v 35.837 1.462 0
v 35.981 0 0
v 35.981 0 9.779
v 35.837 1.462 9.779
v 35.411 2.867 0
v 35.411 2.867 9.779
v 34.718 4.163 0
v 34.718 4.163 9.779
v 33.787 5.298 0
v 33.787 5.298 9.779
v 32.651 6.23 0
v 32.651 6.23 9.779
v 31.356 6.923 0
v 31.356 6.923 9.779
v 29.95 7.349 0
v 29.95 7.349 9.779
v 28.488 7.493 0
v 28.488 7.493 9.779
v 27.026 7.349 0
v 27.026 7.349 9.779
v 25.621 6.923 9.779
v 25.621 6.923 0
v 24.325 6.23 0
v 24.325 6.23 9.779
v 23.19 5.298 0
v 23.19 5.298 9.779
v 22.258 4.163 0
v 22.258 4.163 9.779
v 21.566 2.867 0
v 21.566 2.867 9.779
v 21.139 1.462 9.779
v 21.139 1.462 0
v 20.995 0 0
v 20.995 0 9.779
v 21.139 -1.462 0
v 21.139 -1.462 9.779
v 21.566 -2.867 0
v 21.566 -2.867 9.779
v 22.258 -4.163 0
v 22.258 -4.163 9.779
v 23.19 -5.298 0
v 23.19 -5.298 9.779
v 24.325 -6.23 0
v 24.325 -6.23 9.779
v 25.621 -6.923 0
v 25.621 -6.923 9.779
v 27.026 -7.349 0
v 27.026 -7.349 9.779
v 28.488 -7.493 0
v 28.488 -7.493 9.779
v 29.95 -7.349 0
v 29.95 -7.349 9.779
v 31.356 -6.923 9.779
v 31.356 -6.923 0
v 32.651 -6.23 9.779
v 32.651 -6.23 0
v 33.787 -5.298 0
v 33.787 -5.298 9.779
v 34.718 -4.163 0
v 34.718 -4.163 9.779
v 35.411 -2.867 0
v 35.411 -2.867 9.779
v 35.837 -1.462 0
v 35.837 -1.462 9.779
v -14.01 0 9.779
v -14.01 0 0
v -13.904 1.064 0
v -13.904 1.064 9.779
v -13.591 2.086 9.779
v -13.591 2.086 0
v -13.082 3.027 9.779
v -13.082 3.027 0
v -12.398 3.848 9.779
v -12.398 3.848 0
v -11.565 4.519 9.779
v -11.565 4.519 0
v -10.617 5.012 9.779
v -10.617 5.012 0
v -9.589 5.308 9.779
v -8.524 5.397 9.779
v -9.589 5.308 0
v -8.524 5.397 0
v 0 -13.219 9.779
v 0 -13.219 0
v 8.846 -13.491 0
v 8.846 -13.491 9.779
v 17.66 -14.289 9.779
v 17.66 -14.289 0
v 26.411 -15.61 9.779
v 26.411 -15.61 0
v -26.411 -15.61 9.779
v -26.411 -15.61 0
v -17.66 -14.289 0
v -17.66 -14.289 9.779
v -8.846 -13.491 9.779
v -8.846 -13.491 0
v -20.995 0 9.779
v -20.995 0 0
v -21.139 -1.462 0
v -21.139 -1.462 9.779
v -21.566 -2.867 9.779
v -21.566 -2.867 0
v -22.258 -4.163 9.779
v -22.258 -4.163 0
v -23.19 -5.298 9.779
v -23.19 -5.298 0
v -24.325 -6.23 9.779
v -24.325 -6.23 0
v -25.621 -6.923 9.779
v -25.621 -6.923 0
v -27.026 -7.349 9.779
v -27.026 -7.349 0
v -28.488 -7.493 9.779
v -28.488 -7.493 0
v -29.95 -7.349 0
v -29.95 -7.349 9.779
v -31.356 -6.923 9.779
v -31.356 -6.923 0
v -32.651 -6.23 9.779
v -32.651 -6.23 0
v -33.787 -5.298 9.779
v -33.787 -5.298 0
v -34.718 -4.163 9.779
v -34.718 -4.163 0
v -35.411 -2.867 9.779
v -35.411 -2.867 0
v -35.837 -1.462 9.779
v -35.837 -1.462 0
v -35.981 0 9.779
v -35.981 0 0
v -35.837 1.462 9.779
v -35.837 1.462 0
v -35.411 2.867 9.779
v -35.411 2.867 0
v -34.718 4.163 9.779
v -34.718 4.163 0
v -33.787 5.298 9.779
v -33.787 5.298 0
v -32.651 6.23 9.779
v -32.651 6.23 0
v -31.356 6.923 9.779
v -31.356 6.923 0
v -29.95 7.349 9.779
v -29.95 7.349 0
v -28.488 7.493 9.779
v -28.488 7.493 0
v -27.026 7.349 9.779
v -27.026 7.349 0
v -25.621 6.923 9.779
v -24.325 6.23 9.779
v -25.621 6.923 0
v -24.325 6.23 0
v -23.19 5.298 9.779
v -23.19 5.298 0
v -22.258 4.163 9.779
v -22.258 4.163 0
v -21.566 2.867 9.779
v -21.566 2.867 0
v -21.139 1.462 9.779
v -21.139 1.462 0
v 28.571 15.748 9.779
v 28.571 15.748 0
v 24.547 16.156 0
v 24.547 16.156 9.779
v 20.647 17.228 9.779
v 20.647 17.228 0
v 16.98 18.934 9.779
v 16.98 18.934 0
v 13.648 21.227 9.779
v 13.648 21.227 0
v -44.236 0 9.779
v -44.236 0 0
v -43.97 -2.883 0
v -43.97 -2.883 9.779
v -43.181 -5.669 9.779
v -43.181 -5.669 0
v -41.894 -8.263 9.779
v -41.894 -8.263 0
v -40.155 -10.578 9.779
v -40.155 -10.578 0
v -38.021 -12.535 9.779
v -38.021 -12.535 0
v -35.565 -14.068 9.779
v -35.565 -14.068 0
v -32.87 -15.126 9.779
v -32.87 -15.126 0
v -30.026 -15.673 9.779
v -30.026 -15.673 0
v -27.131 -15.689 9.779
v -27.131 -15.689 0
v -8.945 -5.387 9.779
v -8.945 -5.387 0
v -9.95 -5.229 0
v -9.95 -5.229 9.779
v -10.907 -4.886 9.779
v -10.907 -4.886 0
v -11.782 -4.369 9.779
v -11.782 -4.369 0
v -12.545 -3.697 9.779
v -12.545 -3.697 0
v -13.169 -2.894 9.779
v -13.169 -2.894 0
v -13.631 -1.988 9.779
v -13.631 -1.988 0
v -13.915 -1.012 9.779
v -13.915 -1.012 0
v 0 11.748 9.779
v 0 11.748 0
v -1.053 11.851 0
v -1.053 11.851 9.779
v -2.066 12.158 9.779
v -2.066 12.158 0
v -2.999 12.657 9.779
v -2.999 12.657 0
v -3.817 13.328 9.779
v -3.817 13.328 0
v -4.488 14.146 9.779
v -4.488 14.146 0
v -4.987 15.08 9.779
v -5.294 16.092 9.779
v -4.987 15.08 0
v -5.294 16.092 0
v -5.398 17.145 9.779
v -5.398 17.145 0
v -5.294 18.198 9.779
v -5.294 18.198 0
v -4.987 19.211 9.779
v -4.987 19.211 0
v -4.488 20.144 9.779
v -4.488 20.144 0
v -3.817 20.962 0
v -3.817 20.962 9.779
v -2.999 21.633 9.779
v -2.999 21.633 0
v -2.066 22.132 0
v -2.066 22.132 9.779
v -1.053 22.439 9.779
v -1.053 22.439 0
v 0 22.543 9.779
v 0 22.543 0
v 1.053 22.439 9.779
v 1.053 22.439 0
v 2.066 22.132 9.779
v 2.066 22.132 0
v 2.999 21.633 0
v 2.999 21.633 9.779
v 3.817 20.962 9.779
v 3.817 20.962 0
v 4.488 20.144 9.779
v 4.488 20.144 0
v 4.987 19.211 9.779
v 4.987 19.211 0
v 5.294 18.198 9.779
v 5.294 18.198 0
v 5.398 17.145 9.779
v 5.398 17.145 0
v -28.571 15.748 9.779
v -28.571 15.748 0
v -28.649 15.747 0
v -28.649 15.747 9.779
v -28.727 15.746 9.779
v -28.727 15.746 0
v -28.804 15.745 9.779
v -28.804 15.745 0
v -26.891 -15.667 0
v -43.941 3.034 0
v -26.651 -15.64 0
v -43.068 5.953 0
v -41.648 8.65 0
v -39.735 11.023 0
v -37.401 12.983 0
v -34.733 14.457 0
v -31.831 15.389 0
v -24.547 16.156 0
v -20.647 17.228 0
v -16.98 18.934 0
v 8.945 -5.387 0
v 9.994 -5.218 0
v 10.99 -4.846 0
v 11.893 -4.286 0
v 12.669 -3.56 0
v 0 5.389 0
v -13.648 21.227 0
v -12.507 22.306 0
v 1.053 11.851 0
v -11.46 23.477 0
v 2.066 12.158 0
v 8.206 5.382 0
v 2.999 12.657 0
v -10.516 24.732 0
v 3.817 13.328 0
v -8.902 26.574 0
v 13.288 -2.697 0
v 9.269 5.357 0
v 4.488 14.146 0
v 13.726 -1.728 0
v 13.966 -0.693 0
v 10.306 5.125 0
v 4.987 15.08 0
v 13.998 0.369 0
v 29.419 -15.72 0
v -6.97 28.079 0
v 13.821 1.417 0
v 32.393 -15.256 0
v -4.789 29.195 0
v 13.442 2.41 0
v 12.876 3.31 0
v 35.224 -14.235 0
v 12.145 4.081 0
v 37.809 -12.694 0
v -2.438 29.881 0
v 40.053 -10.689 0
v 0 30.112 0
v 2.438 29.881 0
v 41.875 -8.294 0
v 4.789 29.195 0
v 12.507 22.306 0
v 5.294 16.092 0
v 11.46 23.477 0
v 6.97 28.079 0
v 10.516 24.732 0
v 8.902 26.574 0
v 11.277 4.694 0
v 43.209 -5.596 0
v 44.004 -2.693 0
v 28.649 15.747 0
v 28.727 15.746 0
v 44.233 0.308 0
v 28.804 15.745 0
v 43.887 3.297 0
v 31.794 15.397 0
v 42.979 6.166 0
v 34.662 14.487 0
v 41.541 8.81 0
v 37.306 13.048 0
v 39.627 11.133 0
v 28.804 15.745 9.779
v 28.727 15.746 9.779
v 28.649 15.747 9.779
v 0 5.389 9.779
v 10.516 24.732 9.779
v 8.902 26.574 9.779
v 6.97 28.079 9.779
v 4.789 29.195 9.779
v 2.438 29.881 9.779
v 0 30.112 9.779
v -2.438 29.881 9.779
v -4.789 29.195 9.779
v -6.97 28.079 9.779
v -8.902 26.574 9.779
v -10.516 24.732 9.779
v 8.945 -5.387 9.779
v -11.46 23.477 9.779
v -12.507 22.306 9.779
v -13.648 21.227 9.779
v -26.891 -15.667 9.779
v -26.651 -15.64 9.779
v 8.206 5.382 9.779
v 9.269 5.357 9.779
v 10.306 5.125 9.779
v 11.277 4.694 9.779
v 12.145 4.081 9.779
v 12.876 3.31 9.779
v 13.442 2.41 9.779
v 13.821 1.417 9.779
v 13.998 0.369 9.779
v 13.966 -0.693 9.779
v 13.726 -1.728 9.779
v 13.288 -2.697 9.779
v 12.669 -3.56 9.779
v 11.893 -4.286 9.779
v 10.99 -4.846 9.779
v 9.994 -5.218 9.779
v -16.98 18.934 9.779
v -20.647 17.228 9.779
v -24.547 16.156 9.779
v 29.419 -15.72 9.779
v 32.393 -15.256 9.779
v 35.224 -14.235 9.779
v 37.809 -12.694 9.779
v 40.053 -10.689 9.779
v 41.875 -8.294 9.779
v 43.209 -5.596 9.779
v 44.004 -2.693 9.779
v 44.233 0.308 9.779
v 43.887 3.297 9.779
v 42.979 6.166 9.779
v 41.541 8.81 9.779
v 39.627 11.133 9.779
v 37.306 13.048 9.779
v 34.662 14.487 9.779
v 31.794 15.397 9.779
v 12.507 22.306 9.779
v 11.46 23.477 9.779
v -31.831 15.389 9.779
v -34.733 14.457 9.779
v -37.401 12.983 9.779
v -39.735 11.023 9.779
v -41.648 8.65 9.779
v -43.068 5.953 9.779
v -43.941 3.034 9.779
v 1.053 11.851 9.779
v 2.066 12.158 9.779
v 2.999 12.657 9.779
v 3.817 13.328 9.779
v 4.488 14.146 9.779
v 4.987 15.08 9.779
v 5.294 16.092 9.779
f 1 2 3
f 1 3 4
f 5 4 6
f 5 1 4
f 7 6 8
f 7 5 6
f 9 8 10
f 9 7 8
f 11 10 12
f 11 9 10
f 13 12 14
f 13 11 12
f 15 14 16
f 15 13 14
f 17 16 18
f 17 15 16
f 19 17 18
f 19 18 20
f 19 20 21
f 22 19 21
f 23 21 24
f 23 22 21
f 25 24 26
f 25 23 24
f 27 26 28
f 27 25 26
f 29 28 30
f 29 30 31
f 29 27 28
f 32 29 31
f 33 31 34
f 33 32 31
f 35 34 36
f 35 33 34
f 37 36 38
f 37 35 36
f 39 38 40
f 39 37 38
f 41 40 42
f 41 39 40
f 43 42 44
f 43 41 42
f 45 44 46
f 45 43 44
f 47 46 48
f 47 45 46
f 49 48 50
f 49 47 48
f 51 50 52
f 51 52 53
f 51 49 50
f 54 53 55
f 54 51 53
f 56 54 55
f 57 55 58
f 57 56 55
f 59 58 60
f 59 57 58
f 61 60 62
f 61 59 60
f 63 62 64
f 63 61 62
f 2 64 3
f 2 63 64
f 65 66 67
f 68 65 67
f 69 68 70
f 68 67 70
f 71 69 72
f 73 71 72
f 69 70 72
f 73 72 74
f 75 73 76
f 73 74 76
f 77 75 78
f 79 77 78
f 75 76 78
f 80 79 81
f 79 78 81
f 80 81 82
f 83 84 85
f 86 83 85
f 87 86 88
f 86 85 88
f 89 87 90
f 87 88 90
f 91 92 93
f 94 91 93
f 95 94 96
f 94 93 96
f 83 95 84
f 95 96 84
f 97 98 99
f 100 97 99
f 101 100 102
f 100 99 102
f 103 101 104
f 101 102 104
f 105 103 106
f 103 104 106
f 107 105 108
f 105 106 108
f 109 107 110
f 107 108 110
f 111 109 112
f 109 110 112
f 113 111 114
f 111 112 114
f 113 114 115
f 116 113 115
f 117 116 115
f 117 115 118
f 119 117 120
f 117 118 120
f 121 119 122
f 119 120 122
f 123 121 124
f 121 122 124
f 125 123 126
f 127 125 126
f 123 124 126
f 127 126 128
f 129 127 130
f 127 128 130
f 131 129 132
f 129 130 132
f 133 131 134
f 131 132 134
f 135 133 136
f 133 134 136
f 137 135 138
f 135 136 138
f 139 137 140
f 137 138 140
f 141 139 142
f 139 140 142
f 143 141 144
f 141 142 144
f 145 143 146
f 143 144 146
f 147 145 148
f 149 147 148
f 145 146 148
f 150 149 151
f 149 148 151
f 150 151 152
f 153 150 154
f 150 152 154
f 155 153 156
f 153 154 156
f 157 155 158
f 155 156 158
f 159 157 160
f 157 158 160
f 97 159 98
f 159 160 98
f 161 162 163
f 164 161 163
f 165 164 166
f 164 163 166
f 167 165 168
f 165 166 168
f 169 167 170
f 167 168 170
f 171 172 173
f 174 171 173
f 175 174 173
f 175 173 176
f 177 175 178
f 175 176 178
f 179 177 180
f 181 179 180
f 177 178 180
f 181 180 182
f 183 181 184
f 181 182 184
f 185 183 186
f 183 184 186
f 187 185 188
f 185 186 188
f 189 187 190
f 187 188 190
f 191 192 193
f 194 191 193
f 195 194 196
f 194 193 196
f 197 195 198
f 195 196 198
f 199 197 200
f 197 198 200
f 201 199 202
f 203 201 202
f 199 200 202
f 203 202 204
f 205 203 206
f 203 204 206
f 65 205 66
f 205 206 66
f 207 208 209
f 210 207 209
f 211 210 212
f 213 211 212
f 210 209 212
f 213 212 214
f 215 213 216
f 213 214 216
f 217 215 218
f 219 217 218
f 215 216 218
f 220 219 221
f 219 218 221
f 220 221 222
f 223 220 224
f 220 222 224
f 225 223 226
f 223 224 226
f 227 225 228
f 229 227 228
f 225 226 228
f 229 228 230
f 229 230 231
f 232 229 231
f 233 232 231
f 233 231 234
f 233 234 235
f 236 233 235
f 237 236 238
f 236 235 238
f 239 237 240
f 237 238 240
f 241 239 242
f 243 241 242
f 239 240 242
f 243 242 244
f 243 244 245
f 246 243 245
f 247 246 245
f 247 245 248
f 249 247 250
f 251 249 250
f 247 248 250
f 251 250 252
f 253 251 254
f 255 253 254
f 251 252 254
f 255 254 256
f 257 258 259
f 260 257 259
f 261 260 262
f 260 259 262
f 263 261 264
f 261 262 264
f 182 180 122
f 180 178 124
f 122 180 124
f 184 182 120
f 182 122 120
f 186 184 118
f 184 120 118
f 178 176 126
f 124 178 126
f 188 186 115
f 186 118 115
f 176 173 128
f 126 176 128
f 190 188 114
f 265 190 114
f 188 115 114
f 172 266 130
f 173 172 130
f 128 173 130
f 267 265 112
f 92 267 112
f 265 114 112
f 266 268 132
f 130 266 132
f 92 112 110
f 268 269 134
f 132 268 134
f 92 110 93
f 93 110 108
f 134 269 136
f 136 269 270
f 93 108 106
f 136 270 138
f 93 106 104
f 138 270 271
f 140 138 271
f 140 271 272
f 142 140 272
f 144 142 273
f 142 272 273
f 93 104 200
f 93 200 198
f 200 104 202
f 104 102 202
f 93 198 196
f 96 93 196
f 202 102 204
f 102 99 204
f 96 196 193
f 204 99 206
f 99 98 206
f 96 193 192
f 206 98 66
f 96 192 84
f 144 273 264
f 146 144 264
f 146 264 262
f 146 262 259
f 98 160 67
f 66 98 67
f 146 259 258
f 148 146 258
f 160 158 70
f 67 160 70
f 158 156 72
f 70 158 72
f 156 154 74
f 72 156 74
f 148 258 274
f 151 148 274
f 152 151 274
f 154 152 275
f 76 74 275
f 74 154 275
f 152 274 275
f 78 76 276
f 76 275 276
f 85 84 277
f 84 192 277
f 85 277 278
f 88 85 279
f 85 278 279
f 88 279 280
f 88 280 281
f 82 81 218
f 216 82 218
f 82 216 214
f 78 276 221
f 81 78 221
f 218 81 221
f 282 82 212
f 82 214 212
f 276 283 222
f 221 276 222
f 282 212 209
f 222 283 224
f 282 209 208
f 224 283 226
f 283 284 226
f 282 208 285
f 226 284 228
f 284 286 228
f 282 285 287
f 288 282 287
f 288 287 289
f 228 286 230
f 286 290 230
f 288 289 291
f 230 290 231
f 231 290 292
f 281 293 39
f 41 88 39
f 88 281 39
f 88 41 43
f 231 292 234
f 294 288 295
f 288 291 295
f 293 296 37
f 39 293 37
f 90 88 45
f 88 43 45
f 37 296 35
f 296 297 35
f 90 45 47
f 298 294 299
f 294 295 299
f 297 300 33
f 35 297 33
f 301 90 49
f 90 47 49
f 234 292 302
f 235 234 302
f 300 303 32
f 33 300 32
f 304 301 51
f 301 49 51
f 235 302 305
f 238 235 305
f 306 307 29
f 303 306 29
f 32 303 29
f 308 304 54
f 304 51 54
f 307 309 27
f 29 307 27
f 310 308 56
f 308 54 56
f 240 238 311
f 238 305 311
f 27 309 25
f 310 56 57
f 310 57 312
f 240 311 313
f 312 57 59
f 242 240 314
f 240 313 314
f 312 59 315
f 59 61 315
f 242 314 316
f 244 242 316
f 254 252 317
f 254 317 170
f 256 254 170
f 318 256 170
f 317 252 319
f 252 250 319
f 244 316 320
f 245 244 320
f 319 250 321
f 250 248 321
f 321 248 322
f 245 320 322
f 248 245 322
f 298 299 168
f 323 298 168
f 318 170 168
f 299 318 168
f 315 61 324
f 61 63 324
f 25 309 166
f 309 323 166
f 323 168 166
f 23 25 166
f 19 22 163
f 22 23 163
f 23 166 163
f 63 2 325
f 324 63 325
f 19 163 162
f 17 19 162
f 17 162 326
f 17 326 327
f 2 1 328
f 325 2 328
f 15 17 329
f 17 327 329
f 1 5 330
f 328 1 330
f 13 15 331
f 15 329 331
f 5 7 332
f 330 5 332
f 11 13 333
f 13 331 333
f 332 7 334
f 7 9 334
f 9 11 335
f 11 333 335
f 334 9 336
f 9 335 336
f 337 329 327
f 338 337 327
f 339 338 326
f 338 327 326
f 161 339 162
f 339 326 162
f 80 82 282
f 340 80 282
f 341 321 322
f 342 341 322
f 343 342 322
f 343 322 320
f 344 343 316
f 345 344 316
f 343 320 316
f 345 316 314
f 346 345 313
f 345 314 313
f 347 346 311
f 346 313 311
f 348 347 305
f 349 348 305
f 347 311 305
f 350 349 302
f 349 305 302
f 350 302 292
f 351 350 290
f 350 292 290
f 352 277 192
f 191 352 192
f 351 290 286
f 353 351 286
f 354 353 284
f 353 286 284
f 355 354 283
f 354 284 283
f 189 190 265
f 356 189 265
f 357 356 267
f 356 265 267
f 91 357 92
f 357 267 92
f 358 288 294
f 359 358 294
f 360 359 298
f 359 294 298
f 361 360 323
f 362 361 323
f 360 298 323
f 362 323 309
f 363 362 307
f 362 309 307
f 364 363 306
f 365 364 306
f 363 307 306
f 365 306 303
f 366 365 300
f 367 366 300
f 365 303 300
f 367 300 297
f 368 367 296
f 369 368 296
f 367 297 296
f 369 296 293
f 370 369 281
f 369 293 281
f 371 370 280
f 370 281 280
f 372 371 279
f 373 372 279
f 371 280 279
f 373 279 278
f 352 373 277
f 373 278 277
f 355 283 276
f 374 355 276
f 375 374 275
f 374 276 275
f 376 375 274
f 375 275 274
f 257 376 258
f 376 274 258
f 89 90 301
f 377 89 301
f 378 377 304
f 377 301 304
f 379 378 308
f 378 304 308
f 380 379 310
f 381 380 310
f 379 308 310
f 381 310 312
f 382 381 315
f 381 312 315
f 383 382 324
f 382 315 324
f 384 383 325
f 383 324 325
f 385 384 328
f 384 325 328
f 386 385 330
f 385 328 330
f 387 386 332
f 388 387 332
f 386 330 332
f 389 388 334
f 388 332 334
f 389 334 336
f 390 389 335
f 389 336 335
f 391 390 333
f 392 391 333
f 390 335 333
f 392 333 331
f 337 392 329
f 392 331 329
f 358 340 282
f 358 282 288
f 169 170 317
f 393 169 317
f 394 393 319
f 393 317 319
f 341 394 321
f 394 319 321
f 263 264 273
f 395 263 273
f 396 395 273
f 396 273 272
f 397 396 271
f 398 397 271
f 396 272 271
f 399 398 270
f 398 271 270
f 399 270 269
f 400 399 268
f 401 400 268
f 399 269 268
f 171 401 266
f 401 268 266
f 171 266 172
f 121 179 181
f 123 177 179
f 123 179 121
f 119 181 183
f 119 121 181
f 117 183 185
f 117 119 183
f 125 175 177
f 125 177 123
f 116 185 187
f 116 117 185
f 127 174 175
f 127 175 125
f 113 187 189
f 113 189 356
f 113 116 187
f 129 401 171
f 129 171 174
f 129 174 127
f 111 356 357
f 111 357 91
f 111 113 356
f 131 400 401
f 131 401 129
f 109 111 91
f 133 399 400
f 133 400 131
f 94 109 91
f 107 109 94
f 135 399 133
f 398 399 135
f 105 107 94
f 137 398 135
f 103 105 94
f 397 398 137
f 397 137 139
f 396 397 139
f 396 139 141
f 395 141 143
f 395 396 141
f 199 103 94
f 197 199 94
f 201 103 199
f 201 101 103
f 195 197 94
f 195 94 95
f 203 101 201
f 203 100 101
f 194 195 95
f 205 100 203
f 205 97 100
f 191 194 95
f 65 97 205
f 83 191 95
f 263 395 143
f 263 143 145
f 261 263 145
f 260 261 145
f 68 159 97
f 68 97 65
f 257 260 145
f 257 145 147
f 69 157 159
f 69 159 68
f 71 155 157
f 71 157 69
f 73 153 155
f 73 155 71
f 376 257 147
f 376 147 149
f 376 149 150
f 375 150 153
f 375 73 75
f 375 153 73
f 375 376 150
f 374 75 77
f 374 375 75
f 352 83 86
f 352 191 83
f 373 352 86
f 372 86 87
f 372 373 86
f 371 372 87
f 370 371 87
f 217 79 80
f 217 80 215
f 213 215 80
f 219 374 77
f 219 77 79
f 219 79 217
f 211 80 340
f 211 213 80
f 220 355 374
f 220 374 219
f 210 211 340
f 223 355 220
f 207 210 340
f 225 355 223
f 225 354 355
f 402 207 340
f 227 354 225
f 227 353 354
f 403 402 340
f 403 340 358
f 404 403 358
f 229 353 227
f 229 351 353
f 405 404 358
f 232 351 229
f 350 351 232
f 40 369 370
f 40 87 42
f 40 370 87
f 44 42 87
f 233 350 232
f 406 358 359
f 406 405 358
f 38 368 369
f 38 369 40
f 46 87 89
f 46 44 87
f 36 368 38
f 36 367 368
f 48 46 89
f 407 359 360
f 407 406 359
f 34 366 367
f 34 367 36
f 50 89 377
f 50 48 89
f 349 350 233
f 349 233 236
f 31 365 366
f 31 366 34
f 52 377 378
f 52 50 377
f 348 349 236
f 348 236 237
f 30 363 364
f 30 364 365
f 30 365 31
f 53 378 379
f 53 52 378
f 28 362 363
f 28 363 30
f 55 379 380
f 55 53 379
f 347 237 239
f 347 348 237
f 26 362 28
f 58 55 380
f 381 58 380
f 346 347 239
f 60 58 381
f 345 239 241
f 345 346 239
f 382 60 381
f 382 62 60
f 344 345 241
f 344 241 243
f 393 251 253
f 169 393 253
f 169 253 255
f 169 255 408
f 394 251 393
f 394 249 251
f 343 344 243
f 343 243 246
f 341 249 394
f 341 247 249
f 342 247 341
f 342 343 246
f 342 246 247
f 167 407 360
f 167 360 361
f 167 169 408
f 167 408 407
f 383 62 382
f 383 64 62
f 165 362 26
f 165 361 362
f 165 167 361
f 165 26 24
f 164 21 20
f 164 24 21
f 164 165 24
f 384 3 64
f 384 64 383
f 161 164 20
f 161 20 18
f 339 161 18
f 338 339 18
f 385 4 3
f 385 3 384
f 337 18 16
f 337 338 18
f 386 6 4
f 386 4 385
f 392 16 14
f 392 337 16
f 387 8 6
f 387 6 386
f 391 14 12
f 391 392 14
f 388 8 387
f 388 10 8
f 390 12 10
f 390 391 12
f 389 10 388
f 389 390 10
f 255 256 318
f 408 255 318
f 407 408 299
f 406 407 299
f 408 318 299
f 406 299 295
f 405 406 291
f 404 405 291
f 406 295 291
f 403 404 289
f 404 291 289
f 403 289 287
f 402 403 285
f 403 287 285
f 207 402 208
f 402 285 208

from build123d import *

# Parameters (mm, degrees)
F0_R     = 7.493
F1_DEPTH = 9.779


with BuildPart() as f1:
    # F0 (on Top) → F1 (new body)
    with BuildSketch(Plane.XY):
        with BuildLine():
            ThreePointArc((-28.804382, 15.744827), (-39.735006, 11.023195), (-44.236288, 0))
            ThreePointArc((-44.236288, 0), (-39.133073, -11.605518), (-27.130871, -15.689389))
            ThreePointArc((-27.130871, -15.689389), (-26.77073, -15.654057), (-26.411497, -15.610459))
            ThreePointArc((-26.411497, -15.610459), (-13.259182, -13.824655), (0, -13.219206))
            ThreePointArc((0, -13.219206), (13.259182, -13.824655), (26.411497, -15.610459))
            ThreePointArc((26.411497, -15.610459), (44.190629, -1.198327), (28.804382, 15.744827))
            ThreePointArc((28.804382, 15.744827), (28.687684, 15.746024), (28.570993, 15.747783))
            ThreePointArc((28.570993, 15.747783), (20.647303, 17.228065), (13.648412, 21.227016))
            ThreePointArc((13.648412, 21.227016), (11.970991, 22.880077), (10.515754, 24.731734))
            ThreePointArc((10.515754, 24.731734), (0, 30.111899), (-10.515754, 24.731734))
            ThreePointArc((-10.515754, 24.731734), (-11.970991, 22.880077), (-13.648412, 21.227016))
            ThreePointArc((-13.648412, 21.227016), (-20.647303, 17.228065), (-28.570993, 15.747783))
            ThreePointArc((-28.570993, 15.747783), (-28.687684, 15.746024), (-28.804382, 15.744827))
        make_face()
        with BuildLine():
            ThreePointArc((-35.981288, 0), (-28.488288, 7.493), (-20.995288, 0))
            ThreePointArc((-20.995288, 0), (-28.488288, -7.493), (-35.981288, 0))
        make_face(mode=Mode.SUBTRACT)
        with BuildLine():
            ThreePointArc((-14.010288, 0.000393), (-12.397713, 3.848031), (-8.523938, 5.396769))
            Line((-8.523938, 5.396769), (0, 5.389336))
            Line((0, 5.389336), (8.206422, 5.382181))
            ThreePointArc((8.206422, 5.382181), (13.997631, 0.369419), (8.945243, -5.387252))
            Line((8.945243, -5.387252), (-8.945243, -5.387252))
            ThreePointArc((-8.945243, -5.387252), (-12.545316, -3.697057), (-14.010288, 0.000393))
        make_face(mode=Mode.SUBTRACT)
        with Locations((28.488288, 0)):
            Circle(F0_R, mode=Mode.SUBTRACT)
        with BuildLine():
            ThreePointArc((5.3975, 17.14508), (3.816609, 13.328471), (0, 11.74758))
            ThreePointArc((0, 11.74758), (-3.816609, 20.961689), (5.3975, 17.14508))
        make_face(mode=Mode.SUBTRACT)
    extrude(amount=F1_DEPTH)


solid = f1.part
